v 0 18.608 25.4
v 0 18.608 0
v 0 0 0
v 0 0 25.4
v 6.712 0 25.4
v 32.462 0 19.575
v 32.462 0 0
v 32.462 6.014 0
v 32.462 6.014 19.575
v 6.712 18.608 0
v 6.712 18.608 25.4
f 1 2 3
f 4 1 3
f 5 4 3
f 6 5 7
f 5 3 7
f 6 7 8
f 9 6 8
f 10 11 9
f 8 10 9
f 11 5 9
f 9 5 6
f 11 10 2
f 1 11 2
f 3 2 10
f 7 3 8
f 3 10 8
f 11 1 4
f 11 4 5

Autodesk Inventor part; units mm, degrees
ref_plane "YZ Plane" through (0, 0, 0) normal (1, 0, 0) x (0, 1, 0)
ref_plane "XZ Plane" through (0, 0, 0) normal (0, 1, 0) x (-1, 0, 0)
ref_plane "XY Plane" through (0, 0, 0) normal (0, 0, 1) x (1, 0, 0)
sketch "Sketch1" plane through (0, 0, 0) normal (0, 0, 1) x (1, 0, 0)
  line L0 (0, 0) -> (32.4623, 0)
  line L1 (32.4623, 0) -> (32.4623, 18.6079)
  line L2 (32.4623, 18.6079) -> (0, 18.6079)
  line L3 (0, 18.6079) -> (0, 0)
extrude "Extrusion1" add sketch "Sketch1" along normal blind 25.4
sketch "Sketch2" plane through (0, 0, 25.4) normal (0, 0, 1) x (1, 0, 0)
  line L0 (32.4623, 0) -> (32.4623, 18.6079) projected
  line L1 (32.4623, 18.6079) -> (0, 18.6079) projected
  line L2 (6.7125, 18.6079) -> (32.4623, 6.0135)
extrude "Extrusion2" cut sketch "Sketch2" against normal through all
sketch "Sketch3" plane through (0, 0, 0) normal (0, -1, 0) x (1, 0, 0)
  line L0 (32.4623, 0) -> (32.4623, 25.4) projected
  line L1 (0, 25.4) -> (32.4623, 25.4) projected
  line L2 (6.7125, 25.4) -> (6.7125, 0) projected
  line L3 (6.7125, 25.4) -> (32.4623, 19.5746)
extrude "Extrusion3" cut sketch "Sketch3" against normal through all
properties part number "Work Planes"
